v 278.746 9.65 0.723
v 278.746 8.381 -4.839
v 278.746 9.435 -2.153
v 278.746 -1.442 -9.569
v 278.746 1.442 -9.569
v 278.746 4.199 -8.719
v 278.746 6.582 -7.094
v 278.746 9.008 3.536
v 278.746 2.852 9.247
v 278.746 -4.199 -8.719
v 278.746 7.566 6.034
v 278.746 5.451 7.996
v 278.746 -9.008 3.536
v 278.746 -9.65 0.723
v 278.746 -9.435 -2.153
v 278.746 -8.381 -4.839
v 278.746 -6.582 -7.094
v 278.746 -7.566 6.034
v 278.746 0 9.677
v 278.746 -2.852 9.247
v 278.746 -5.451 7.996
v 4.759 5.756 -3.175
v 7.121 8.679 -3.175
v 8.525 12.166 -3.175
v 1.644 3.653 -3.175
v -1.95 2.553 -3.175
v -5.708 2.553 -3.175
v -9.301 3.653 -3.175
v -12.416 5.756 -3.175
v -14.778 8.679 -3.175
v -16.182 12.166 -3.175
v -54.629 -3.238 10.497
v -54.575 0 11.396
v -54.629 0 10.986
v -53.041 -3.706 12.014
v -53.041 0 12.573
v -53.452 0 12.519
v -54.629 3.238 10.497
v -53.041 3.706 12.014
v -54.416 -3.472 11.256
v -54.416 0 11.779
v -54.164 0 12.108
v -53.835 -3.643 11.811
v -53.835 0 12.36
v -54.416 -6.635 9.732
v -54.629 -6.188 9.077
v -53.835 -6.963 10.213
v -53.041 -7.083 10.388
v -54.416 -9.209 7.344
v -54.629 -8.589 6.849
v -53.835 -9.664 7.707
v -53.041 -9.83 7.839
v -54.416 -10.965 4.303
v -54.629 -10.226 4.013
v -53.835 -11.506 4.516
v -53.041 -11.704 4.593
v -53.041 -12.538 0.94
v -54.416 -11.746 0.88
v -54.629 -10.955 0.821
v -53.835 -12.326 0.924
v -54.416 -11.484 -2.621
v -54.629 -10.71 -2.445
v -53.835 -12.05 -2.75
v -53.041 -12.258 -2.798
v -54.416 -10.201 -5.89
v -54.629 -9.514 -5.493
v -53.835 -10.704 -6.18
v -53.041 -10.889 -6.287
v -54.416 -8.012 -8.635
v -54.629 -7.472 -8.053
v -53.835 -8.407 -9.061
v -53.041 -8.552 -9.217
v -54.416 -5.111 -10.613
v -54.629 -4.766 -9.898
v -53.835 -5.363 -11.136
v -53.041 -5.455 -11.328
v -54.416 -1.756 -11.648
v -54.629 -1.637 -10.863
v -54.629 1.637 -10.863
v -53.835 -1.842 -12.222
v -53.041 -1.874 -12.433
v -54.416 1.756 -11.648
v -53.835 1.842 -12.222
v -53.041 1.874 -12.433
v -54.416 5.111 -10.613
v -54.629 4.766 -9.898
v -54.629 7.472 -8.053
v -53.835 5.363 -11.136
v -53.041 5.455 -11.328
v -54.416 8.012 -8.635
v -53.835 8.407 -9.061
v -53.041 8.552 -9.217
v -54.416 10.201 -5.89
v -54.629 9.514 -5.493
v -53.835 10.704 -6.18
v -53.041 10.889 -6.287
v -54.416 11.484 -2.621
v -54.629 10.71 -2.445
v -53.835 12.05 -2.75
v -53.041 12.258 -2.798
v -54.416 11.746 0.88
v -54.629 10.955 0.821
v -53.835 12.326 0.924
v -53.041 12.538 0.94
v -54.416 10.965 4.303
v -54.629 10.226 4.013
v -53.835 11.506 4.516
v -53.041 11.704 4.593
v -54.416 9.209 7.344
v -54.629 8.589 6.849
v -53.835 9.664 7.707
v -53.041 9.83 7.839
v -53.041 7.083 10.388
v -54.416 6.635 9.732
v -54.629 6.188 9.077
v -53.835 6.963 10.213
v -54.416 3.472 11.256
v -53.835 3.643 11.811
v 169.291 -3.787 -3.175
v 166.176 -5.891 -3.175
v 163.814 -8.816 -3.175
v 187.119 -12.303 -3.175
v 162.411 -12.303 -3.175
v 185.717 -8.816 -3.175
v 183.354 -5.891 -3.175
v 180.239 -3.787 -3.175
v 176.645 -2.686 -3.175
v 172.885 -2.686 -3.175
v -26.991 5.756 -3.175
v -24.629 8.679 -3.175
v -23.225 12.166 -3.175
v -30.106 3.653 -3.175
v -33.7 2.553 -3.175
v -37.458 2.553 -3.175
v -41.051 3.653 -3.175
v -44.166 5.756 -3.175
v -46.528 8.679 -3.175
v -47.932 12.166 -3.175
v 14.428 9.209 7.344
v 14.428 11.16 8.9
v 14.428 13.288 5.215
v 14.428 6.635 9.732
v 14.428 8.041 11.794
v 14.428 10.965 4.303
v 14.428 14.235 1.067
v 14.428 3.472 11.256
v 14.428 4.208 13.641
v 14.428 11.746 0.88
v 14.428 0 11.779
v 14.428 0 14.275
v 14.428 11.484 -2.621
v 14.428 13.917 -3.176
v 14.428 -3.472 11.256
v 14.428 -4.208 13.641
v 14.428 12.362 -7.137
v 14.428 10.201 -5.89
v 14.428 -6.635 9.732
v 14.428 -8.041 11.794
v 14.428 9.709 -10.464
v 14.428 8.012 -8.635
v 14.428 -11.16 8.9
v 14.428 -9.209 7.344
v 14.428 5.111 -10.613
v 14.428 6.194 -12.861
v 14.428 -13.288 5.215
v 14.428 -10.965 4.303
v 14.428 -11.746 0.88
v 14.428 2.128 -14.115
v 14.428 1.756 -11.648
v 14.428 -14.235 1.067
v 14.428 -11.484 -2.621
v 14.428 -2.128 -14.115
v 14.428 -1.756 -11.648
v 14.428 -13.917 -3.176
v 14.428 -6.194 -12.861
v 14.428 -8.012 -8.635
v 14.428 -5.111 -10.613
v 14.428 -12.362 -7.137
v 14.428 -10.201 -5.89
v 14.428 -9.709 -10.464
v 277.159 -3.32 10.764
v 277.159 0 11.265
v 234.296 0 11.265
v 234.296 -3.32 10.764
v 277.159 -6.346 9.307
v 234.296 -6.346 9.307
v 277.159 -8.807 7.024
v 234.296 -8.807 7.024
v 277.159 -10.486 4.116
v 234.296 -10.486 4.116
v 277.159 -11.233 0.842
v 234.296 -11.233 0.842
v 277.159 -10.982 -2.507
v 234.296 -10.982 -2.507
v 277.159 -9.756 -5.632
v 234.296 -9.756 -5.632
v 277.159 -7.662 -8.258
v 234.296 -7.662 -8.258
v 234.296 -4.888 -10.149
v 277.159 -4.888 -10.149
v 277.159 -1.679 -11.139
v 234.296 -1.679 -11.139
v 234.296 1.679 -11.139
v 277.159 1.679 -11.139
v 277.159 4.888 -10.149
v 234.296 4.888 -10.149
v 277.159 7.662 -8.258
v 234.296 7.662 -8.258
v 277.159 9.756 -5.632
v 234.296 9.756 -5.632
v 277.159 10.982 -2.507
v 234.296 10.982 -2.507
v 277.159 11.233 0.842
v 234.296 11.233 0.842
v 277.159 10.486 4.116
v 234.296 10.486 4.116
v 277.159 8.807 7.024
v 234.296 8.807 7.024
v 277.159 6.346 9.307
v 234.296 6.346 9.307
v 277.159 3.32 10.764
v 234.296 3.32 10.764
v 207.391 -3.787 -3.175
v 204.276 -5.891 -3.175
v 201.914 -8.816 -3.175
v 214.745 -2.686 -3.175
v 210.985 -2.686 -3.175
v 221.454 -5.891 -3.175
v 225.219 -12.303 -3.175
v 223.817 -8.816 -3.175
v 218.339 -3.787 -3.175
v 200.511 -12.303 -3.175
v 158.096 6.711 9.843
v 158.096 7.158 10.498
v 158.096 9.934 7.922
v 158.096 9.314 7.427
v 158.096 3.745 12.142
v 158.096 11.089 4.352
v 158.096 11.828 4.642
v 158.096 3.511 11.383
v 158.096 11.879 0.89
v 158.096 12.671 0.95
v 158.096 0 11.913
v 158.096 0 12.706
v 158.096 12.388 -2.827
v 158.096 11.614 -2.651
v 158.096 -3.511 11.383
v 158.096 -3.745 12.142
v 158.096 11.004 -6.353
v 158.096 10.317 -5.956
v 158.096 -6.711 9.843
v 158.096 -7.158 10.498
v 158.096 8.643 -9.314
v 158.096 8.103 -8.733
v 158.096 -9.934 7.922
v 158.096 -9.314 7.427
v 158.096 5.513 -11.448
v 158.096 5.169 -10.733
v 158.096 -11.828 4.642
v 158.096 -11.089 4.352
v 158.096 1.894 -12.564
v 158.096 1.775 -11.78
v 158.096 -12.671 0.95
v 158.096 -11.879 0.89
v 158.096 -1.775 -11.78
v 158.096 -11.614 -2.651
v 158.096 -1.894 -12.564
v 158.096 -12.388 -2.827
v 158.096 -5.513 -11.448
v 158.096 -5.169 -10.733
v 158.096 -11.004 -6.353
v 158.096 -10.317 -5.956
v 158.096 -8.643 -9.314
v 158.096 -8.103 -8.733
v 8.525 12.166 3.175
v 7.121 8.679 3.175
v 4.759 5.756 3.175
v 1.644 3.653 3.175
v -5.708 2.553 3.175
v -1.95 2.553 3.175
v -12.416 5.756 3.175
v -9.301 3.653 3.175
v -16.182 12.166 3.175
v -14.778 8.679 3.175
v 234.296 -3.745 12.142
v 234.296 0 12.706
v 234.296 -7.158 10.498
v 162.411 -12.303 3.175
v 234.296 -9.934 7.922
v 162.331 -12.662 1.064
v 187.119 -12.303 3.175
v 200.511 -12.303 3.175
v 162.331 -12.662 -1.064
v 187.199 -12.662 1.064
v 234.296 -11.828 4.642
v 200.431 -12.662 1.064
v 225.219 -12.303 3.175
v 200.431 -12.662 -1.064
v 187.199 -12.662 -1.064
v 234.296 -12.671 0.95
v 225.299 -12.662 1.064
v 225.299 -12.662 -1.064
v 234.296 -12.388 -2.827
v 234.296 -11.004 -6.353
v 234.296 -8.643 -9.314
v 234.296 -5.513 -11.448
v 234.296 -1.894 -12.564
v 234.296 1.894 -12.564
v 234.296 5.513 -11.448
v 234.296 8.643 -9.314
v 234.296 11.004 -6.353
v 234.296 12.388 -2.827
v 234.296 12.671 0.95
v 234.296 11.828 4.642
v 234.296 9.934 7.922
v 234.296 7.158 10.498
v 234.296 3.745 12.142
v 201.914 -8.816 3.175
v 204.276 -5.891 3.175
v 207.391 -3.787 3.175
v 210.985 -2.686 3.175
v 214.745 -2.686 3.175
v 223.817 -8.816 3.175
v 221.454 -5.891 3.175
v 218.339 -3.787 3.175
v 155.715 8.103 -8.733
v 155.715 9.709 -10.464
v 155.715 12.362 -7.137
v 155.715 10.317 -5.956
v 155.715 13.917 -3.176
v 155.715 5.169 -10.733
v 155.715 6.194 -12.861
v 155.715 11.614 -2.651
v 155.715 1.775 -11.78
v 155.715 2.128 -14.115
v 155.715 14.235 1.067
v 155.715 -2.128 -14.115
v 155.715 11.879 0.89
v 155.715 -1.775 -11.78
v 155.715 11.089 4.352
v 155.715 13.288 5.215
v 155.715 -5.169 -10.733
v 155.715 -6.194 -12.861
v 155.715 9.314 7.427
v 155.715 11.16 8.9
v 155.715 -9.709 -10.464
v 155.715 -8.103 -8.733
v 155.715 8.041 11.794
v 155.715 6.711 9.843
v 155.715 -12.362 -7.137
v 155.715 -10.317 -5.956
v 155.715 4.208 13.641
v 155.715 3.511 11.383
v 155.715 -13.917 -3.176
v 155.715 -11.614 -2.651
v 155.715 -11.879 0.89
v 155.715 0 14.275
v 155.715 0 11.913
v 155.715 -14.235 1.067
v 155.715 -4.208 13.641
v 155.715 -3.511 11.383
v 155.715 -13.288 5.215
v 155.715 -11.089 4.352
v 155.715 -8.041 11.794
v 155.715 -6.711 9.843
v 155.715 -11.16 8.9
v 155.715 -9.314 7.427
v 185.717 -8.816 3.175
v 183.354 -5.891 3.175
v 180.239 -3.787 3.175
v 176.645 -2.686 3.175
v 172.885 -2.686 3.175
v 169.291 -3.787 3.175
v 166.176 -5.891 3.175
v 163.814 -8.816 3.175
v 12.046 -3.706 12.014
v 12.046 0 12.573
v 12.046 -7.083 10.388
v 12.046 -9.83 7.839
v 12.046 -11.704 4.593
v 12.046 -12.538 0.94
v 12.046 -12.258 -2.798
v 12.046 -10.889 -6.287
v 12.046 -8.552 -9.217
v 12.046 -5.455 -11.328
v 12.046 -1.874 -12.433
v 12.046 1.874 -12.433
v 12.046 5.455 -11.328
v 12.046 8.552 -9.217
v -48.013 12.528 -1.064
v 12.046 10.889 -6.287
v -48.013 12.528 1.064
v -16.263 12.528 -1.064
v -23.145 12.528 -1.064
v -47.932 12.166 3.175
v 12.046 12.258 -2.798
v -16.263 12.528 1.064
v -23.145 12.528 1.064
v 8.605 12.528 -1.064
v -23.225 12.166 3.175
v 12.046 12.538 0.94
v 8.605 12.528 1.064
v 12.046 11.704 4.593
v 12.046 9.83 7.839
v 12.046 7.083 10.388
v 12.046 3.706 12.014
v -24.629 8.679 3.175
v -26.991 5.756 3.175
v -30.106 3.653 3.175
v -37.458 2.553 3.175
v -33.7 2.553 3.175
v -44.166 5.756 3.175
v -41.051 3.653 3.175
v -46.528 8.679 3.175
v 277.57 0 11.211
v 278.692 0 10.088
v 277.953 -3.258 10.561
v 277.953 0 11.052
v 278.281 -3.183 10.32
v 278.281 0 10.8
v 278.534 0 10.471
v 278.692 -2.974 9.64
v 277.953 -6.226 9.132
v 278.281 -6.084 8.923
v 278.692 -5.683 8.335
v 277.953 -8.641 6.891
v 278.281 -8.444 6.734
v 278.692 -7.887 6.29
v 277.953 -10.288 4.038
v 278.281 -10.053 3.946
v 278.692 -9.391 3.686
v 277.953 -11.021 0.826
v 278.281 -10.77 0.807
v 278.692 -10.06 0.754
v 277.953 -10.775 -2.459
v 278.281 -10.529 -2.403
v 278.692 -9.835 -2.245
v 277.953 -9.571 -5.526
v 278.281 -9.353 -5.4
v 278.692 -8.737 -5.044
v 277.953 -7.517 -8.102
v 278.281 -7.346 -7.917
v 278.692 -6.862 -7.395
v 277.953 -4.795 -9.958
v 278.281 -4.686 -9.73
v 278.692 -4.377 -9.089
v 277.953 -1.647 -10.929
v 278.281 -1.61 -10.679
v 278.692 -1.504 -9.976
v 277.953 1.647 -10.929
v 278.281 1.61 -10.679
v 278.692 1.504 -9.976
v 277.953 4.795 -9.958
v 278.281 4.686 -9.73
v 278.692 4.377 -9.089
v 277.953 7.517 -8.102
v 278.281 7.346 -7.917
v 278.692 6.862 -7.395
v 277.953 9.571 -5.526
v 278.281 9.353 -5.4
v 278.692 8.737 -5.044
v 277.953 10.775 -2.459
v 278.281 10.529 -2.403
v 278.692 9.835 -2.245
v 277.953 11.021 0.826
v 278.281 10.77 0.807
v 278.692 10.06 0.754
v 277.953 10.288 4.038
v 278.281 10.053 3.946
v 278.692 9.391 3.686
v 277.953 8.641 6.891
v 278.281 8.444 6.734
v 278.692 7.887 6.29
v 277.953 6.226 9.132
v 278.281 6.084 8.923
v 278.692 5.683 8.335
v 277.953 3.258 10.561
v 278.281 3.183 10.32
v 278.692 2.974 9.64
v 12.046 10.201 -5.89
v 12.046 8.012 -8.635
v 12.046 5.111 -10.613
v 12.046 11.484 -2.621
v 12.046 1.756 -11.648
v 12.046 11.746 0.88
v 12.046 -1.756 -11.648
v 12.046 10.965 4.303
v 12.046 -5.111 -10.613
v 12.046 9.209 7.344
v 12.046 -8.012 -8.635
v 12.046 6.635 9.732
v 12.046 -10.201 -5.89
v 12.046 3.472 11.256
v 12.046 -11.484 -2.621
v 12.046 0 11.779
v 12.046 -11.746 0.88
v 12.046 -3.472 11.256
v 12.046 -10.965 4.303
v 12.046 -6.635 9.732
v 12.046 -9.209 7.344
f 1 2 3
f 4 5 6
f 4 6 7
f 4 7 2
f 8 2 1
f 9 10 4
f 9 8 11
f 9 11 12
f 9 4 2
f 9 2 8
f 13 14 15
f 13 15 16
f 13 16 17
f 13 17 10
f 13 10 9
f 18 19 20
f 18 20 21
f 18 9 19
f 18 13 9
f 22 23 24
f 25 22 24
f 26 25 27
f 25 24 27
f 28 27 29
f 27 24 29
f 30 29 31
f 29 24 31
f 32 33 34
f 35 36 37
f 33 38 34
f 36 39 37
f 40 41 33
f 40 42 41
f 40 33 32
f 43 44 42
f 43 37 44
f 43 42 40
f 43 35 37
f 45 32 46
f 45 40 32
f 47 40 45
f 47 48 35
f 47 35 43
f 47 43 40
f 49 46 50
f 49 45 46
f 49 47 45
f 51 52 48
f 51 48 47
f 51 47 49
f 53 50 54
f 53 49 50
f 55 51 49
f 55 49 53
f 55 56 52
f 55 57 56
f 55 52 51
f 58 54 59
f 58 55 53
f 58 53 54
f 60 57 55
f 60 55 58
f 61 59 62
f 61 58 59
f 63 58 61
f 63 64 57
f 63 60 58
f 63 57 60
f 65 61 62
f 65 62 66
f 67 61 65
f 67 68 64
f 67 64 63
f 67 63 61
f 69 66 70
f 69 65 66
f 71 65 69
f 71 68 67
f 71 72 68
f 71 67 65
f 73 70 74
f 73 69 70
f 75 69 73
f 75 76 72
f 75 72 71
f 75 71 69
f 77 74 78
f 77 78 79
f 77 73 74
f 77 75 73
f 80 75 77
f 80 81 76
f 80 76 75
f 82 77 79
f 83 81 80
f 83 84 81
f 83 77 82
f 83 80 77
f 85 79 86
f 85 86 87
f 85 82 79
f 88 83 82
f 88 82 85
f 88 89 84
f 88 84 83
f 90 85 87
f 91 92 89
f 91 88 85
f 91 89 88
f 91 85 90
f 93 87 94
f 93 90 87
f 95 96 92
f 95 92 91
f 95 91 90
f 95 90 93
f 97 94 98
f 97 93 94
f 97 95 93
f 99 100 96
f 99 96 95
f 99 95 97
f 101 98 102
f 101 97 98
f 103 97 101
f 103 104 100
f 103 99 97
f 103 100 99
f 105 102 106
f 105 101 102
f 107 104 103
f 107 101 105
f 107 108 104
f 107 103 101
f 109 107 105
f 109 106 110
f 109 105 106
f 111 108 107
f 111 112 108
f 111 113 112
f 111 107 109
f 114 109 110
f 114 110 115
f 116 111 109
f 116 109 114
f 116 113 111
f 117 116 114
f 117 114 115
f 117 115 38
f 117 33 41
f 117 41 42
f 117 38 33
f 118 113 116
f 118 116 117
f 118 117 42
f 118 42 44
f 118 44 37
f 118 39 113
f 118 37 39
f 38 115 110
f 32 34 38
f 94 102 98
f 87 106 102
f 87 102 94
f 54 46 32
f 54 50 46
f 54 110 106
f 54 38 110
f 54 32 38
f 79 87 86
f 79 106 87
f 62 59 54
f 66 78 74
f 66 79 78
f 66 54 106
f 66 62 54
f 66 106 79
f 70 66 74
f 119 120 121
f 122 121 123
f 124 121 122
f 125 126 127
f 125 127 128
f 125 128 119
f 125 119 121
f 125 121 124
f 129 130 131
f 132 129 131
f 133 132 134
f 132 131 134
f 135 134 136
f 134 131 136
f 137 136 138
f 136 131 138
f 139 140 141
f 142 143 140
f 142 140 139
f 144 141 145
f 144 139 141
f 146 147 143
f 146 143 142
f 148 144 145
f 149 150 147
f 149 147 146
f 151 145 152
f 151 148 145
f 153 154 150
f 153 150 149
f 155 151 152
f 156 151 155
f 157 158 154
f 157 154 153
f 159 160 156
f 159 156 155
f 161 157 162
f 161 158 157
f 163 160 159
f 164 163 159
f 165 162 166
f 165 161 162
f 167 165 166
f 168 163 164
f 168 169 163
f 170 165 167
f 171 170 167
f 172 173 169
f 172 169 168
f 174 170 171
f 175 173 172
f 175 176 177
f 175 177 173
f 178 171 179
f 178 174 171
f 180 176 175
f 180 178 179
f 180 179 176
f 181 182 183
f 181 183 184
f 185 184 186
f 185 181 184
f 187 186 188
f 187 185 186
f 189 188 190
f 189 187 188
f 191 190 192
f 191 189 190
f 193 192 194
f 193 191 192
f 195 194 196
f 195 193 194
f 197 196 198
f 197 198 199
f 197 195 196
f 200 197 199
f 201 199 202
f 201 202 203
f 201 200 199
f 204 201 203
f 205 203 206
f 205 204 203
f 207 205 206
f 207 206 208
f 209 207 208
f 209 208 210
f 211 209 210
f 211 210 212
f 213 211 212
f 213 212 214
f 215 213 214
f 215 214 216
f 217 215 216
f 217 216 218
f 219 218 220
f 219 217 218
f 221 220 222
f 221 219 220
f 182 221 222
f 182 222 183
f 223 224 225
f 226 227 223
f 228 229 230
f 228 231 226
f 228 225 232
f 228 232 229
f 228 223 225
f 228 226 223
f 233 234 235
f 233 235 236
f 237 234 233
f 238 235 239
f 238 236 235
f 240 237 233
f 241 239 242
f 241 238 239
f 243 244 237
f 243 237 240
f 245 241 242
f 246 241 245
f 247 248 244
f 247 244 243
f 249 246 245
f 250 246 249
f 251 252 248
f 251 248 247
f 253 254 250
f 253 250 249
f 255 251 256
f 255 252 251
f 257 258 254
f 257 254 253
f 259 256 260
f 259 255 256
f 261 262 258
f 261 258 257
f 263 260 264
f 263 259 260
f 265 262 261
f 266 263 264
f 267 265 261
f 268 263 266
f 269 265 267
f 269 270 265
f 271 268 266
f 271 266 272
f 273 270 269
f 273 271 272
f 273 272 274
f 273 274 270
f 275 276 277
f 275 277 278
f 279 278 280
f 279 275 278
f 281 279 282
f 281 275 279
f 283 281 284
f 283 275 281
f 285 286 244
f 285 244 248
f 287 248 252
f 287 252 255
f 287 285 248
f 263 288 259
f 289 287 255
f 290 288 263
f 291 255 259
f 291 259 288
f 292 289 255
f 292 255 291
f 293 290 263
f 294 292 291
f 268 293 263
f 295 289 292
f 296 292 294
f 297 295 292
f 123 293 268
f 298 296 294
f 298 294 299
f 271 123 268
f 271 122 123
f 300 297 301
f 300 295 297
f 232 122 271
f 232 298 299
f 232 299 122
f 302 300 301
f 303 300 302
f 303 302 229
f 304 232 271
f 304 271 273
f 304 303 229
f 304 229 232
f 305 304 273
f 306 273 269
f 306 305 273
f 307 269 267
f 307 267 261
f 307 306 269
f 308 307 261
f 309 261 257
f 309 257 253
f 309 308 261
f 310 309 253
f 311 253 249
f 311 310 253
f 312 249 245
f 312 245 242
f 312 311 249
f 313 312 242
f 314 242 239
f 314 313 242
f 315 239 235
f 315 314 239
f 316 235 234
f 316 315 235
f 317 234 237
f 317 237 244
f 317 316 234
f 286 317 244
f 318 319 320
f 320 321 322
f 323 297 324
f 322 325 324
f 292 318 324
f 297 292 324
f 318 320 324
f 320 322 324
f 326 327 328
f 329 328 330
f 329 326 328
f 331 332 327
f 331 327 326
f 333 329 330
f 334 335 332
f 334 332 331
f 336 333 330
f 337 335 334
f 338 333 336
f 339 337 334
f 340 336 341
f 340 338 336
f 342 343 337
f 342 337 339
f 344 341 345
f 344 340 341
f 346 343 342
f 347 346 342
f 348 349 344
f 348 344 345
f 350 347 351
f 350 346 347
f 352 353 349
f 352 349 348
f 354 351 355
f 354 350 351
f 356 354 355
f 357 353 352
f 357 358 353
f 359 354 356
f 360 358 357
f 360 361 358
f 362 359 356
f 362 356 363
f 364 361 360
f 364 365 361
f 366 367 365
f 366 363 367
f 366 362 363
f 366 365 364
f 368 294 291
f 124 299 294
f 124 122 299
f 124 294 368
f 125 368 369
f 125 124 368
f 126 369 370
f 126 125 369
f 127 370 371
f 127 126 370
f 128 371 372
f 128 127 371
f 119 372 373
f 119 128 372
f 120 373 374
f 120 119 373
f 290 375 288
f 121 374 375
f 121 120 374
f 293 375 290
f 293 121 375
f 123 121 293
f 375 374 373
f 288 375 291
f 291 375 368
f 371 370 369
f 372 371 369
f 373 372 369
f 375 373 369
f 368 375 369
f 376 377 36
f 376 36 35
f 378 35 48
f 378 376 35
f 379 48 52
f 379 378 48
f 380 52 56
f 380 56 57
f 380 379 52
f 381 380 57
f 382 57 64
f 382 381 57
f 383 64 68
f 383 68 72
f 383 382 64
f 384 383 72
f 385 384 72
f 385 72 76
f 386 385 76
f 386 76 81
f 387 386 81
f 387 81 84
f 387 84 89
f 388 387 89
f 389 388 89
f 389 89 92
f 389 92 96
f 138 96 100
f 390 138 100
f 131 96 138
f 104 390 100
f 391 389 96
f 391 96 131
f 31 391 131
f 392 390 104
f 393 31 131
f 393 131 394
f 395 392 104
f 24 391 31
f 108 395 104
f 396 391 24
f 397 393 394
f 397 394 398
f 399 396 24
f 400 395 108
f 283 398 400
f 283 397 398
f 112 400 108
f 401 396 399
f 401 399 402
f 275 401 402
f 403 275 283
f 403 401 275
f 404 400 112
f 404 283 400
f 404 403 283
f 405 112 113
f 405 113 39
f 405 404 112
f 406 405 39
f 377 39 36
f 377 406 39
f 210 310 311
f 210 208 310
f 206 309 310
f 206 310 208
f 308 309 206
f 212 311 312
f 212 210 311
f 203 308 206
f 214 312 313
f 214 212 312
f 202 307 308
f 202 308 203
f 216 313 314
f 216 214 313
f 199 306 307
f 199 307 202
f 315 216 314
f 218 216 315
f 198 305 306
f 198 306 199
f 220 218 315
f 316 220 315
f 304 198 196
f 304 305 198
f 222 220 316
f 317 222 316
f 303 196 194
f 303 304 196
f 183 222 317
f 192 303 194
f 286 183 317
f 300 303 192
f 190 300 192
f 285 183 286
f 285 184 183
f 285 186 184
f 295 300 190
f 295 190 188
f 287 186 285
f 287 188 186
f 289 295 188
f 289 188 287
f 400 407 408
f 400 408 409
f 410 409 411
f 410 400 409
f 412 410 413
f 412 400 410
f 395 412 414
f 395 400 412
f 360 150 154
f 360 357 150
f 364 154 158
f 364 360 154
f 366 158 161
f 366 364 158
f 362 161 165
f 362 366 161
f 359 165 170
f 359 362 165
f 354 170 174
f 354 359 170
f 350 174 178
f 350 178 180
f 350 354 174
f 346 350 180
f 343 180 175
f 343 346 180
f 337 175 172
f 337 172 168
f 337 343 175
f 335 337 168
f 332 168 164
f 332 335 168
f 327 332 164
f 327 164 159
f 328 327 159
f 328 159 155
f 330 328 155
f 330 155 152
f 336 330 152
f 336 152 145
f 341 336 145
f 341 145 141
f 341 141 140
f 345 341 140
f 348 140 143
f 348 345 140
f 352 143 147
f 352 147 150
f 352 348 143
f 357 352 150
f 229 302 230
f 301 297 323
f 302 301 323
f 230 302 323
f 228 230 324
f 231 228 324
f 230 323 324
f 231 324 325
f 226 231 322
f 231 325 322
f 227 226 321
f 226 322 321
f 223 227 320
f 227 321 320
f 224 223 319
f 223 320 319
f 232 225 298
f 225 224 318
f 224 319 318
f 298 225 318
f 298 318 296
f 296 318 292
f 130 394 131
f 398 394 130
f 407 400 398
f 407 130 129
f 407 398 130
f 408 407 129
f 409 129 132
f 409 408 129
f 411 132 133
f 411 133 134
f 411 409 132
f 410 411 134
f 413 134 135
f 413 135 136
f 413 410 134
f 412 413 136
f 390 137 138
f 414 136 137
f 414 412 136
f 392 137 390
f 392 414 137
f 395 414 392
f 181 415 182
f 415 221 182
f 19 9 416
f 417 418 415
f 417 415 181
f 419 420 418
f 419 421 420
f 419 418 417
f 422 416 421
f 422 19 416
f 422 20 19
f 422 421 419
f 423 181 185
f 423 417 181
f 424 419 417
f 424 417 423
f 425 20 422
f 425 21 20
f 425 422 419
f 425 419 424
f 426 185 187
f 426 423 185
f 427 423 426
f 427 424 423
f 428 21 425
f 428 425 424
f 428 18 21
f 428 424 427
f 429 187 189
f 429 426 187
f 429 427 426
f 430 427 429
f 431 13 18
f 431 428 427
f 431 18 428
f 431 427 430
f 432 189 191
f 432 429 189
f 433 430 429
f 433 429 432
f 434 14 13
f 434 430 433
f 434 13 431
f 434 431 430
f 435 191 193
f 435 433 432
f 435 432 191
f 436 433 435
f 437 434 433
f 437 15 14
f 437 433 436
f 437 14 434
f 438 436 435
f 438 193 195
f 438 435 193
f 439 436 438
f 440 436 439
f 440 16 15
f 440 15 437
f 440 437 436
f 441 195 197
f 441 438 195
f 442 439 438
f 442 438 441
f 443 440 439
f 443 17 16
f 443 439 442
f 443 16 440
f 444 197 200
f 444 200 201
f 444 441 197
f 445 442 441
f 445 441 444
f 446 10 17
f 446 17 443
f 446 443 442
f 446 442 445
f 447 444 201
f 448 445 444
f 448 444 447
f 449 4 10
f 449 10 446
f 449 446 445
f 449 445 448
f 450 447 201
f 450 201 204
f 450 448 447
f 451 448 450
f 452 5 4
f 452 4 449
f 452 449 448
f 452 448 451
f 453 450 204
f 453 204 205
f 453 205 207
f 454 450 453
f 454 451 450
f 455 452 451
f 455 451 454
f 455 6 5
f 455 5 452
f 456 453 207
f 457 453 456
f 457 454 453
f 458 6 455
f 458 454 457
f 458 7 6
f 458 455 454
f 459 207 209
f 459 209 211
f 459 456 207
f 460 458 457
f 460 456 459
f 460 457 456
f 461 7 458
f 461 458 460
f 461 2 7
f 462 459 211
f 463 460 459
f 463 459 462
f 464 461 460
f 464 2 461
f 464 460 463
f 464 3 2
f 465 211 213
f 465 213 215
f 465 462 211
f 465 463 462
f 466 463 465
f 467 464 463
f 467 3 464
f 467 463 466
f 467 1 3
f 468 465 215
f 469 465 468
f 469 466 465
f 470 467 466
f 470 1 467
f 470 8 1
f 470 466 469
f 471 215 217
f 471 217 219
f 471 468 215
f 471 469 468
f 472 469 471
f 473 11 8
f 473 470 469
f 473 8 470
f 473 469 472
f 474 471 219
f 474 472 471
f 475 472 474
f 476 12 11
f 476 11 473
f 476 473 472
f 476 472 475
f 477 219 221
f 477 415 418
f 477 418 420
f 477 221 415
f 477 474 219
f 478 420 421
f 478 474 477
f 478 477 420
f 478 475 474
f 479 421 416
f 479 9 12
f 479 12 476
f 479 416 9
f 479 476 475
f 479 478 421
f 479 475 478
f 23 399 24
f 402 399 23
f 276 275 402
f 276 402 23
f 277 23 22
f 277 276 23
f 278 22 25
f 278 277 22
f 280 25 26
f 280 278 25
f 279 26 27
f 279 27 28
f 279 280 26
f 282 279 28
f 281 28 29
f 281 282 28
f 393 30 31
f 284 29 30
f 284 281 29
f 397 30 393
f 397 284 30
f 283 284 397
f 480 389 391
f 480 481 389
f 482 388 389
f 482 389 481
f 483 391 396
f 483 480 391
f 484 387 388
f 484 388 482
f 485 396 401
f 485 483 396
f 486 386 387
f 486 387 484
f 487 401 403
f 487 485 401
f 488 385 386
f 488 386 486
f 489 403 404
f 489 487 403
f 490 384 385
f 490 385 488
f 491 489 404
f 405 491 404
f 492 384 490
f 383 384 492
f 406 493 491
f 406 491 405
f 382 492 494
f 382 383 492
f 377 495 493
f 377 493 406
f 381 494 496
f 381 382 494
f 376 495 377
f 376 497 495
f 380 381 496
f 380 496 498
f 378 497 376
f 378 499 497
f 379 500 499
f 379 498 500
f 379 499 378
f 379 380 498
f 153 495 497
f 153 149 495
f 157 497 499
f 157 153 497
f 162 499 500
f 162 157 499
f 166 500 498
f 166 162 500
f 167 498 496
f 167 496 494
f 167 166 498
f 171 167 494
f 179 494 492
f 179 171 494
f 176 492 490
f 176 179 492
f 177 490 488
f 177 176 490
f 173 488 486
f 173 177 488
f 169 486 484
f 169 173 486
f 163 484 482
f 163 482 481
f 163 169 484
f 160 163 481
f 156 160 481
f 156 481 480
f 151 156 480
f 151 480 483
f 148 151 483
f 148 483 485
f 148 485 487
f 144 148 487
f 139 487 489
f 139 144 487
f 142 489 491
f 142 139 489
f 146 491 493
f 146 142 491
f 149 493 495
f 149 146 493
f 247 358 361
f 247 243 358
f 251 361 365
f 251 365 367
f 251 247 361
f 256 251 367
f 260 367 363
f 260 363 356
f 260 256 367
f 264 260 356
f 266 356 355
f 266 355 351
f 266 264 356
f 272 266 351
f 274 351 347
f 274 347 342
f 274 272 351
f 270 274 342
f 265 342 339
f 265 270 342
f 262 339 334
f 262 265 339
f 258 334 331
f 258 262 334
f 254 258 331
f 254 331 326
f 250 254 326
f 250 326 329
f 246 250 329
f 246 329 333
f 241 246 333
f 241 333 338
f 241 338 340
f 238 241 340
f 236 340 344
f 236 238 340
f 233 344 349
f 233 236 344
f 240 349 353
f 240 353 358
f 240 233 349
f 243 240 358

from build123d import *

# Parameters (mm, degrees)
FILLET1_R          = 1.5875
CUT_EXTRUDE1_DEPTH = 3.175
LPATTERN1_COUNT    = 2
LPATTERN1_PITCH    = 31.75
CUT_EXTRUDE2_DEPTH = 3.175


with BuildPart() as part:
    # Sketch1 → Revolve1 (revolve)
    with BuildSketch(Plane.XY, mode=Mode.PRIVATE) as revolve1_sk:
        Polygon((-54.628661224, 0), (-54.628661224, 12.573), (12.046338776, 12.573), (12.046338776, 11.77925), (14.427588776, 11.77925), (14.427588776, 14.2748), (155.715088776, 14.2748), (155.715088776, 11.9126), (158.096338776, 11.9126), (158.096338776, 12.70635), (234.296338776, 12.70635), (234.296338776, 11.2649), (278.746338776, 11.2649), (278.746338776, 0), align=None)
    revolve(revolve1_sk.sketch.rotate(Axis((-43.218877551, 0, 0), (1, 0, 0)), 90), axis=Axis((-43.218877551, 0, 0), (1, 0, 0)))

    # Fillet1
    fillet1_edges = [part.edges().sort_by_distance(p)[0] for p in [
        (-54.628661224, 0, -12.573),
        (278.746338776, 0, -11.2649),
    ]]
    fillet(fillet1_edges, radius=FILLET1_R)

    # Sketch2 → Cut-Extrude1 (cut, symmetric)
    with BuildSketch(Plane.XY):
        with BuildLine():
            Line((-48.022069118, 12.573), (-23.135253331, 12.573))
            ThreePointArc((-23.135253331, 12.573), (-35.578661224, 2.413), (-48.022069118, 12.573))
        make_face()
    cut_extrude1 = extrude(amount=CUT_EXTRUDE1_DEPTH, both=True, mode=Mode.SUBTRACT)

    # LPattern1: Cut-Extrude1 ×2
    with Locations(*[(i * LPATTERN1_PITCH, 0, 0) for i in range(1, LPATTERN1_COUNT)]):
        add(cut_extrude1, mode=Mode.SUBTRACT)

    # Sketch3 → Cut-Extrude2 (cut, symmetric)
    with BuildSketch(Plane.XY):
        with BuildLine():
            Line((162.321680882, -12.70635), (187.208496669, -12.70635))
            ThreePointArc((187.208496669, -12.70635), (174.765088776, -2.54635), (162.321680882, -12.70635))
        make_face()
        with BuildLine():
            Line((200.421680882, -12.70635), (225.308496669, -12.70635))
            ThreePointArc((225.308496669, -12.70635), (212.865088776, -2.54635), (200.421680882, -12.70635))
        make_face()
    extrude(amount=CUT_EXTRUDE2_DEPTH, both=True, mode=Mode.SUBTRACT)


solid = part.part
